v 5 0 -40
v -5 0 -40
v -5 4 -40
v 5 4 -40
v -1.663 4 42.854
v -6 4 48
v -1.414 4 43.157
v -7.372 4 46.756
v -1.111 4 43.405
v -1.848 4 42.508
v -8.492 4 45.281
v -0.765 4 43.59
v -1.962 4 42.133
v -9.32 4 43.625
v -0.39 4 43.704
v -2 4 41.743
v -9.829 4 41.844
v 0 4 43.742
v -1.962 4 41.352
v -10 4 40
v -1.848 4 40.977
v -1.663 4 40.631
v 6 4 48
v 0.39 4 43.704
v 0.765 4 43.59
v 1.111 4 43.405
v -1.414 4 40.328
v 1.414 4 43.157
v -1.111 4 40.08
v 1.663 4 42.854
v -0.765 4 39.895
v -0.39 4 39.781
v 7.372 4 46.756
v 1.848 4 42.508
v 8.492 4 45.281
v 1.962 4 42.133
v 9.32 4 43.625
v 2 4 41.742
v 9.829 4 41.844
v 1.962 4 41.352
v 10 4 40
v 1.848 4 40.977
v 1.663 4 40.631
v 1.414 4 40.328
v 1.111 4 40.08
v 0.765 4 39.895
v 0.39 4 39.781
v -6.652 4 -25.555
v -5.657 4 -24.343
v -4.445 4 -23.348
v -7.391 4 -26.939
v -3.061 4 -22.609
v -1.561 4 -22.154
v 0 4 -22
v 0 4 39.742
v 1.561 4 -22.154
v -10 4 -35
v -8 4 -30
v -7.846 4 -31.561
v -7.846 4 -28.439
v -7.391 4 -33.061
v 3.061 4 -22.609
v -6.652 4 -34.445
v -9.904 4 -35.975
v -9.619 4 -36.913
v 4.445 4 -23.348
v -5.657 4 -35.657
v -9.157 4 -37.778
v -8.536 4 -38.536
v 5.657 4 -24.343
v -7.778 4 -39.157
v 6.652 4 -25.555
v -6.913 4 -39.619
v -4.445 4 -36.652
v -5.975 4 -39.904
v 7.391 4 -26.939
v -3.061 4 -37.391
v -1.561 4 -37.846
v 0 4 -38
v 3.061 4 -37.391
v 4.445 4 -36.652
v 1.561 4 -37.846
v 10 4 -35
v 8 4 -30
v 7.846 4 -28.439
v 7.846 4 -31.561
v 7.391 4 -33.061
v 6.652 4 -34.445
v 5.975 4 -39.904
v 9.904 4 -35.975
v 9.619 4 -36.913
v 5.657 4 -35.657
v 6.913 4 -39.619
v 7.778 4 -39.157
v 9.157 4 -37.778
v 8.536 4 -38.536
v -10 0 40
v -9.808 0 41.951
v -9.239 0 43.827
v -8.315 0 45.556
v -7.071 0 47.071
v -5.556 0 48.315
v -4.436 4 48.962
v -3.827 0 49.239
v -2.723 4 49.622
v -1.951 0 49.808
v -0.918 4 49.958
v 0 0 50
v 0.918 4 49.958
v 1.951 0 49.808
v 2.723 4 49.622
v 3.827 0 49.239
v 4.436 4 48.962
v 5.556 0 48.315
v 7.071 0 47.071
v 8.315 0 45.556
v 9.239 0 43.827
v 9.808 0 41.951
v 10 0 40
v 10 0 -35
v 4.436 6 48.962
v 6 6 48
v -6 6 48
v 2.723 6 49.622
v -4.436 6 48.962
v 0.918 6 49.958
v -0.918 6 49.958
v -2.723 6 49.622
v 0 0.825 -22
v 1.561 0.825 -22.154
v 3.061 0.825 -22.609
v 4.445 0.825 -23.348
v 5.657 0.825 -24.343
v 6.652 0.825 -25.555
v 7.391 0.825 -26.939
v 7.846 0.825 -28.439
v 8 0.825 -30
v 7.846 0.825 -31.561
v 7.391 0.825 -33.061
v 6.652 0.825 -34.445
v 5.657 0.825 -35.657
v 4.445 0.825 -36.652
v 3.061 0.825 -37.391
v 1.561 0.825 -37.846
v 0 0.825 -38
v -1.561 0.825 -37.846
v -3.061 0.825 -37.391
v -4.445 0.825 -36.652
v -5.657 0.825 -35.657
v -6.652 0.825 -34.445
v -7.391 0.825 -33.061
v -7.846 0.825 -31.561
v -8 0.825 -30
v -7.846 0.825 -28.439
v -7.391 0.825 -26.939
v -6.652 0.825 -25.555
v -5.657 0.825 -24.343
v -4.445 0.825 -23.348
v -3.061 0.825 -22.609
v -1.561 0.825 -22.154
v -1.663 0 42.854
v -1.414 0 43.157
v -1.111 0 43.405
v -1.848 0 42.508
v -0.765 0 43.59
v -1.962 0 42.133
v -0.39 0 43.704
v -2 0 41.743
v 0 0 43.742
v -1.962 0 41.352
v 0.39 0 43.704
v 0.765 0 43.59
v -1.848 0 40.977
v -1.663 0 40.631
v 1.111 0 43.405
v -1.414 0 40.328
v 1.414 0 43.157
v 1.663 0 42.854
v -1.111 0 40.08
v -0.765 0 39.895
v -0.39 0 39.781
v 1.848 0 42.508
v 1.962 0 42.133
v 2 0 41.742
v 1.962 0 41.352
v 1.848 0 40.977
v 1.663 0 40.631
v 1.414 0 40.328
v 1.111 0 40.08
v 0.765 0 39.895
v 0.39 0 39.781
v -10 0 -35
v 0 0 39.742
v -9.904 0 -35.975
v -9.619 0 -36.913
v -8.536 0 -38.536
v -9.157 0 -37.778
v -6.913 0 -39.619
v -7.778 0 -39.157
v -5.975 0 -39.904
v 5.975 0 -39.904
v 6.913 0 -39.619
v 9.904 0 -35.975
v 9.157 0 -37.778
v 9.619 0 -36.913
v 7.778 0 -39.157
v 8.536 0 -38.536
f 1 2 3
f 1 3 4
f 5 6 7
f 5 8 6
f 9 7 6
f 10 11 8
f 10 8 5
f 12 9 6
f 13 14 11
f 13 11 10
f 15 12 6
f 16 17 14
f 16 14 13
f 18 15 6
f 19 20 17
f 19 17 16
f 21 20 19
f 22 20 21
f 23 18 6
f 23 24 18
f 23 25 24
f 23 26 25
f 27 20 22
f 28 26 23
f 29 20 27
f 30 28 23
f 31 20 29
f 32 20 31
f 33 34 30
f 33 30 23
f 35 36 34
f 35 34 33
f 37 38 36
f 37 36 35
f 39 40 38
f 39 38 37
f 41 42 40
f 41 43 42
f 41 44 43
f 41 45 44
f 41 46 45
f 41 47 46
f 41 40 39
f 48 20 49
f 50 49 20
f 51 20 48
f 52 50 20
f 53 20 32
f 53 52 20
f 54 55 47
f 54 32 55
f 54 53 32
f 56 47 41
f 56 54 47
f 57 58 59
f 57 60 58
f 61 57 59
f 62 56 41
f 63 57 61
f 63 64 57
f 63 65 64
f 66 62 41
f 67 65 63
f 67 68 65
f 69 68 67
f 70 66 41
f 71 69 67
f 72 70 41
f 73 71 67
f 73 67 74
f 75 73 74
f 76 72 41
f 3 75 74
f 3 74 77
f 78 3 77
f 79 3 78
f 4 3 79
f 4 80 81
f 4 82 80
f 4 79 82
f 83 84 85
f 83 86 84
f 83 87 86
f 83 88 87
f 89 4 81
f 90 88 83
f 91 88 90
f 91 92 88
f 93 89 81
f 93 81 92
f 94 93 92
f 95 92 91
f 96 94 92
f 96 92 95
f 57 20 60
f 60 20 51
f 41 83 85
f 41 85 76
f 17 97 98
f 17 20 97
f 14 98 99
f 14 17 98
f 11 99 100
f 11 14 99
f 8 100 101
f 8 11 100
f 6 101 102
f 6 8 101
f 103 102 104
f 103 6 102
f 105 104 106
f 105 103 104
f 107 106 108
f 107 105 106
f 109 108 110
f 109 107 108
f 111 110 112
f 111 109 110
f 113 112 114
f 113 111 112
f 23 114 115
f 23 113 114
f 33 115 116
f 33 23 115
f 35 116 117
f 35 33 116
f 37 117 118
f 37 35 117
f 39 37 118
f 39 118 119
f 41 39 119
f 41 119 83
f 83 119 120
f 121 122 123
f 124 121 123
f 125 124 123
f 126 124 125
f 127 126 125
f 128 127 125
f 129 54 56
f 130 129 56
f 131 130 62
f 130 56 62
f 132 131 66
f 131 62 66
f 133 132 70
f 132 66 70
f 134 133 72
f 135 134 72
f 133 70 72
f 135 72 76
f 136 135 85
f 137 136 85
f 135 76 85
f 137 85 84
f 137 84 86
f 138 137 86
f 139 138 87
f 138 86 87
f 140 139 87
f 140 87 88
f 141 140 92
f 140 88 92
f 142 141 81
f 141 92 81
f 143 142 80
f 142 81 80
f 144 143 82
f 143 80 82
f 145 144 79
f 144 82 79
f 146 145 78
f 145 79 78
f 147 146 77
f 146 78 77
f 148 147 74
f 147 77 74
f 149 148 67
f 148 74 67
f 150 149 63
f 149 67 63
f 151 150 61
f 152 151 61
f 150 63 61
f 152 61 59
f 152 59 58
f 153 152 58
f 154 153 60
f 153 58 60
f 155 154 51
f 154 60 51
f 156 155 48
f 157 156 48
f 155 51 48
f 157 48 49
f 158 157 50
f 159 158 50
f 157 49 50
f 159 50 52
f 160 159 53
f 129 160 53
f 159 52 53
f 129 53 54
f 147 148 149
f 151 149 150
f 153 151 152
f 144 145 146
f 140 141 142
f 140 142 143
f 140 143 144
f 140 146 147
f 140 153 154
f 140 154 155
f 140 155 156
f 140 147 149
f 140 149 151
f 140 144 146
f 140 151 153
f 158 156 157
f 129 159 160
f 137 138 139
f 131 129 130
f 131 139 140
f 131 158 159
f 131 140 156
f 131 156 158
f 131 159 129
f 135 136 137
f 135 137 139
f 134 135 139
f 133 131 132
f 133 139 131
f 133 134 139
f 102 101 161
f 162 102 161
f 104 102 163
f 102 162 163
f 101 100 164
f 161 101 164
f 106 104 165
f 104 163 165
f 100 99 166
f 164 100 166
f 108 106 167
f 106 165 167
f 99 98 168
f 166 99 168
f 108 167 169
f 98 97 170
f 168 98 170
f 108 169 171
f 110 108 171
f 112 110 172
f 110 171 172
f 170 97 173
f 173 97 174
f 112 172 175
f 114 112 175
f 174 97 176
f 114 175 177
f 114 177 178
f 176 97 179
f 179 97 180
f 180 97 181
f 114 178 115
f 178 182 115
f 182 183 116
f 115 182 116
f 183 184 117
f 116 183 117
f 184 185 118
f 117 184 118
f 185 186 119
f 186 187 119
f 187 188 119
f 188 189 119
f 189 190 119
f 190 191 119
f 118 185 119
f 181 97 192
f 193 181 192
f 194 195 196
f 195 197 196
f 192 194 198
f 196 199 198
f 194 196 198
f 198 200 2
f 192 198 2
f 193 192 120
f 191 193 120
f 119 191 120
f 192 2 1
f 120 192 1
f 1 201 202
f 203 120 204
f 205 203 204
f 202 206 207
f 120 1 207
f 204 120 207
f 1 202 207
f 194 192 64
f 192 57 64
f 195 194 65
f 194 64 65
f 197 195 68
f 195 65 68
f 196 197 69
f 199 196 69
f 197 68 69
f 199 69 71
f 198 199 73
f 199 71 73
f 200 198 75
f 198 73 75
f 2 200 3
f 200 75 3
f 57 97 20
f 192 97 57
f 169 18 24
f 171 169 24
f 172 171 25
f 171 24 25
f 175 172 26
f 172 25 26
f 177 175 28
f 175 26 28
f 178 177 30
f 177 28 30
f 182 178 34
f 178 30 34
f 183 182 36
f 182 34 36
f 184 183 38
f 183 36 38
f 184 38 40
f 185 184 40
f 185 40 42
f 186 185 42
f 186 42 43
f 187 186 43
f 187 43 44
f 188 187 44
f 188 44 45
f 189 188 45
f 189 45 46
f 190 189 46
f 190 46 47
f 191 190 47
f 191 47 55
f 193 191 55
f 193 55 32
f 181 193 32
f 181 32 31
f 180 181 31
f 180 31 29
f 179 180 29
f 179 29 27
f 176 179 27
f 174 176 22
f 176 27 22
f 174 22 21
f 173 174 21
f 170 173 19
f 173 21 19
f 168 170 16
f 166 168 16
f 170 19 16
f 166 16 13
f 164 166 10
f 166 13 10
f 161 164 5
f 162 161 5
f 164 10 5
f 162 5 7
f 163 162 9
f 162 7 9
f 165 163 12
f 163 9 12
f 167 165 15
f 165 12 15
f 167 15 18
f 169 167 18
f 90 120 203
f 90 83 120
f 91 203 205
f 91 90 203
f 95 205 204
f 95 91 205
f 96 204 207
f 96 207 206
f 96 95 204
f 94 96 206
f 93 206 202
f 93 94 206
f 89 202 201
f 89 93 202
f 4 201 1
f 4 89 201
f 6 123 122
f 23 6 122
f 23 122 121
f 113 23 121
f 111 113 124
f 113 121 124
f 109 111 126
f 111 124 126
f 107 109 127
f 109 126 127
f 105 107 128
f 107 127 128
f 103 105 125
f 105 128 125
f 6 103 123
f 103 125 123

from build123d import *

# Parameters (mm, degrees)
SKETCH1_W           = 20
SKETCH1_H           = 80
BOSS_EXTRUDE1_DEPTH = 4
SKETCH8_R           = 10
BOSS_EXTRUDE2_DEPTH = 4
SKETCH9_R           = 8
CUT_EXTRUDE1_DEPTH  = 3.175
SKETCH10_R          = 2
CUT_EXTRUDE2_DEPTH  = 52.14684741
BOSS_EXTRUDE3_START = 2
BOSS_EXTRUDE3_DEPTH = 2
FILLET1_R           = 5


with BuildPart() as part:
    # Sketch1 → Boss-Extrude1 (new body)
    with BuildSketch(Plane(origin=(0, 0, 0), x_dir=(1, 0, 0), z_dir=(0, 1, 0))):
        Rectangle(SKETCH1_W, SKETCH1_H)
    extrude(amount=BOSS_EXTRUDE1_DEPTH)

    # Sketch8 → Boss-Extrude2 (add)
    with BuildSketch(Plane(origin=(0, 4, 0), x_dir=(1, 0, 0), z_dir=(0, 1, 0))):
        with Locations((0, -40)):
            Circle(SKETCH8_R)
    extrude(amount=-BOSS_EXTRUDE2_DEPTH)

    # Sketch9 → Cut-Extrude1 (cut)
    with BuildSketch(Plane(origin=(0, 4, 0), x_dir=(1, 0, 0), z_dir=(0, 1, 0))):
        with Locations(Location((0, 30, 0), (0, 0, 270))):
            Circle(SKETCH9_R)
    extrude(amount=-CUT_EXTRUDE1_DEPTH, mode=Mode.SUBTRACT)

    # Sketch10 → Cut-Extrude2 (cut, through all)
    with BuildSketch(Plane(origin=(0, 4, 0), x_dir=(1, 0, 0), z_dir=(0, 1, 0))):
        with Locations(Location((0, -41.7425, 0), (0, 0, 270))):
            Circle(SKETCH10_R)
    extrude(amount=-CUT_EXTRUDE2_DEPTH, mode=Mode.SUBTRACT)

    # Sketch11 → Boss-Extrude3 (add)
    with BuildSketch(Plane(origin=(0, 4, 0), x_dir=(1, 0, 0), z_dir=(0, 1, 0)).offset(BOSS_EXTRUDE3_START)):
        with BuildLine():
            Line((-6, -48), (6, -48))
            ThreePointArc((6, -48), (0, -50), (-6, -48))
        make_face()
    extrude(amount=-BOSS_EXTRUDE3_DEPTH)

    # Fillet1
    fillet1_edges = [part.edges().sort_by_distance(p)[0] for p in [
        (-10, 2, -40),
        (10, 2, -40),
    ]]
    fillet(fillet1_edges, radius=FILLET1_R)


solid = part.part
